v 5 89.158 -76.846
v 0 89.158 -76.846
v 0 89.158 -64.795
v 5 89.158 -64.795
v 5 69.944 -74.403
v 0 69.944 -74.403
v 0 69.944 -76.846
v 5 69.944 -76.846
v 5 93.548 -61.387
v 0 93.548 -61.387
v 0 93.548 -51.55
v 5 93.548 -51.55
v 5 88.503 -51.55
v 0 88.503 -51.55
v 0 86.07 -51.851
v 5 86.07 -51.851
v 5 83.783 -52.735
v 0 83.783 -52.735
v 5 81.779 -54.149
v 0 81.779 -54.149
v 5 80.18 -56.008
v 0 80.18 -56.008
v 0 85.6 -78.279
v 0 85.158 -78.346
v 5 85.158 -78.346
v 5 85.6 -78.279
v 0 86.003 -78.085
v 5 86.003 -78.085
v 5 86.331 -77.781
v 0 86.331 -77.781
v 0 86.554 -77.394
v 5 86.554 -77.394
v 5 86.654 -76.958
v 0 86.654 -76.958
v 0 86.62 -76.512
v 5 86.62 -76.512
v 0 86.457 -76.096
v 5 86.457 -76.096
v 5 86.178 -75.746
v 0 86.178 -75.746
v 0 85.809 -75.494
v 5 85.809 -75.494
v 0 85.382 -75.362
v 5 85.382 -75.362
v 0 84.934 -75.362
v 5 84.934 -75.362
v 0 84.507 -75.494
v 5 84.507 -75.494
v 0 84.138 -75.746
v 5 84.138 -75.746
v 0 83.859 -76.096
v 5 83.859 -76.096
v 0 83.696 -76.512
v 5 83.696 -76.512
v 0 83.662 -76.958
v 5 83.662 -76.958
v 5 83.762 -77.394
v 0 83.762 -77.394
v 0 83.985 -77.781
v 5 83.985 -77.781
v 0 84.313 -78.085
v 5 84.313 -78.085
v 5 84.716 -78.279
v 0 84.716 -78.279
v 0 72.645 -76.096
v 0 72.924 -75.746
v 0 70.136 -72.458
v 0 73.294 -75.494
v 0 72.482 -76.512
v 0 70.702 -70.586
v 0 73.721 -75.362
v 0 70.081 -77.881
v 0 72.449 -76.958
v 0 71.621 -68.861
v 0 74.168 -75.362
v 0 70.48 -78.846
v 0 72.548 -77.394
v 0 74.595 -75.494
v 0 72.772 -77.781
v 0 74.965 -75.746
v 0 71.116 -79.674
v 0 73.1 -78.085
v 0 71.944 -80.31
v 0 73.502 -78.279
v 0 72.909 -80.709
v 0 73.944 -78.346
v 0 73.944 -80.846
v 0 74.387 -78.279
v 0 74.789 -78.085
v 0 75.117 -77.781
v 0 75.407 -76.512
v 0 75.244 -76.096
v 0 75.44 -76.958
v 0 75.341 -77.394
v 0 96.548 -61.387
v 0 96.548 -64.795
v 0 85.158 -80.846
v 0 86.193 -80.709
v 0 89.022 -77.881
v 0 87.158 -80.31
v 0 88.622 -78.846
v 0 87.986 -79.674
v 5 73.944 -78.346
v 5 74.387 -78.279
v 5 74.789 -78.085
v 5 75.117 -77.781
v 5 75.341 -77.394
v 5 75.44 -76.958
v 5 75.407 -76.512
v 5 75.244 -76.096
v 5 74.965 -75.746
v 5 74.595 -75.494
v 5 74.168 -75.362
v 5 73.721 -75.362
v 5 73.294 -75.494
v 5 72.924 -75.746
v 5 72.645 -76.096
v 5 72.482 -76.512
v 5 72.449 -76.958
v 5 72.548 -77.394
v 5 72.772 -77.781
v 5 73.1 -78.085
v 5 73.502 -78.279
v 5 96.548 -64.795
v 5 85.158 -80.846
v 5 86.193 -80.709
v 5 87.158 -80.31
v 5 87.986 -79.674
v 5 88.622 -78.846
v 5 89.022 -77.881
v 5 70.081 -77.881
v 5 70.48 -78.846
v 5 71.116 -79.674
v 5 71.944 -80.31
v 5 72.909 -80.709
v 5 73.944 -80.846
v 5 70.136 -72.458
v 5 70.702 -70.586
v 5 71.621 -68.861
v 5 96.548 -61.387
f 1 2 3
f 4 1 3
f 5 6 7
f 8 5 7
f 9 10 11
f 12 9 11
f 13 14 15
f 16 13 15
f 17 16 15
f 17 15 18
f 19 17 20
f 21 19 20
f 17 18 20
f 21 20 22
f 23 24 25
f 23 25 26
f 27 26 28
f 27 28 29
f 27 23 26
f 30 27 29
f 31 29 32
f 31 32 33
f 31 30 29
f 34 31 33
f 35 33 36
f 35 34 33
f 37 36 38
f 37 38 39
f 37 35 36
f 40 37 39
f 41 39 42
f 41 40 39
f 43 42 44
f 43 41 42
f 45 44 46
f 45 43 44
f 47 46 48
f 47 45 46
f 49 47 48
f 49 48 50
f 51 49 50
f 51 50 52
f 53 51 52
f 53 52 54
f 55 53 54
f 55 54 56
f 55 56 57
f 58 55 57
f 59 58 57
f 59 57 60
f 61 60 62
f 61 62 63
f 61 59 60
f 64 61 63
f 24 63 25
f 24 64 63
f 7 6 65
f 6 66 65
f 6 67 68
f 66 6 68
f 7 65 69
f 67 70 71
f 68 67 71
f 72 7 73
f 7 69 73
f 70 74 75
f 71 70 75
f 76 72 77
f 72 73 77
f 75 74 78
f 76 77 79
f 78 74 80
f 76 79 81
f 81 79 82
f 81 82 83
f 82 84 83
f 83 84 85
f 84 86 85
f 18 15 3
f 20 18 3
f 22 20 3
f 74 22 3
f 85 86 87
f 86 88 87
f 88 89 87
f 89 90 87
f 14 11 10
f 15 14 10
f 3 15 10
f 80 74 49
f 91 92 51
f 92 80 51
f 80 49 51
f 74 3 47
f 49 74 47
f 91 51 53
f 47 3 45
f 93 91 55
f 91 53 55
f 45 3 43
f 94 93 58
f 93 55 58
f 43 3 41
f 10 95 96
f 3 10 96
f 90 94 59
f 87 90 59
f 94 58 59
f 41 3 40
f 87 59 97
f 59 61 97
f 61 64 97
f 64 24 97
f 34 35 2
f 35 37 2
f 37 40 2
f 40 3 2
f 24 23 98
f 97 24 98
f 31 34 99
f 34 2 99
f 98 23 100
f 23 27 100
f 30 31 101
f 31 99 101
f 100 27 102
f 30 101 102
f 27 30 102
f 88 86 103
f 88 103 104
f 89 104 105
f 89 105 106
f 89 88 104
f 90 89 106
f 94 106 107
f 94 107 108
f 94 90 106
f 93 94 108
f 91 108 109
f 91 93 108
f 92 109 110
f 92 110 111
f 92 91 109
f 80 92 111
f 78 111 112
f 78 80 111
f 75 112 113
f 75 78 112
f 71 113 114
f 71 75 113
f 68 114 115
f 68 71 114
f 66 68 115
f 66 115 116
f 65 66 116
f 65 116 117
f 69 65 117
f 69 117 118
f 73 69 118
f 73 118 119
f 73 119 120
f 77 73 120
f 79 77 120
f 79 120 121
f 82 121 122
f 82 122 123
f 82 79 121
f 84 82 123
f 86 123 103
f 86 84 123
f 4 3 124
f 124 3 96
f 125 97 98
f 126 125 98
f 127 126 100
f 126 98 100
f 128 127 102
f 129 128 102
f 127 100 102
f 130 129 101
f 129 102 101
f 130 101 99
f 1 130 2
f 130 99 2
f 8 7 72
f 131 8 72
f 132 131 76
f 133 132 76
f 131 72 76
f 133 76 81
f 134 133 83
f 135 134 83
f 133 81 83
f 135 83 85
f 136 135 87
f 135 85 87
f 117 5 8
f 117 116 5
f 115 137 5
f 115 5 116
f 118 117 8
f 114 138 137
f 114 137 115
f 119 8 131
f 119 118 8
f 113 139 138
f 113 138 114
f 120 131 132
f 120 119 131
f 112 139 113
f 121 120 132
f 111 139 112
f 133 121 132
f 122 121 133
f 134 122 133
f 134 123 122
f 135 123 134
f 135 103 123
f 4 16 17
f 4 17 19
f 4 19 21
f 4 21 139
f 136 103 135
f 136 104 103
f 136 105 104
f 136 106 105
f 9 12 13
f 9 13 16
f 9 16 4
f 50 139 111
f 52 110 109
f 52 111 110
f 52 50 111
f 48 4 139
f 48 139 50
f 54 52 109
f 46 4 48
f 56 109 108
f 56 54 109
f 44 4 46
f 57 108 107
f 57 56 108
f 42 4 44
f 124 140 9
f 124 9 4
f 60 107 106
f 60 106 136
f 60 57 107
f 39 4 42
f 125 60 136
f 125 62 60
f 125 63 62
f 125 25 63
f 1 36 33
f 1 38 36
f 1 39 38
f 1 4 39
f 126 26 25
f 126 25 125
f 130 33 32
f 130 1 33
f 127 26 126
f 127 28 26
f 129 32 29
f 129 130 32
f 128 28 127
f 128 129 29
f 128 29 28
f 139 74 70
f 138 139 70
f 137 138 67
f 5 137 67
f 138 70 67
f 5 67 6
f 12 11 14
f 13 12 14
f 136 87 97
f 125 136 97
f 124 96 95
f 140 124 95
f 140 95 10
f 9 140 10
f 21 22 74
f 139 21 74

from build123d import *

# Parameters (mm, degrees)
SKETCH1_R           = 4
SKETCH1_R_2         = 1.5
BOSS_EXTRUDE1_DEPTH = 5


with BuildPart() as part:
    # Sketch1 → Boss-Extrude1 (new body)
    with BuildSketch(Plane(origin=(0, 0, 0), x_dir=(0, 0, -1), z_dir=(1, 0, 0))):
        with Locations((76.845680628, 73.944481469)):
            Circle(SKETCH1_R)
        with Locations((76.845680628, 73.944481469)):
            Circle(SKETCH1_R_2, mode=Mode.SUBTRACT)
        with Locations((76.845680628, 85.158009083)):
            Circle(SKETCH1_R)
        with Locations((76.845680628, 85.158009083)):
            Circle(SKETCH1_R_2, mode=Mode.SUBTRACT)
        with BuildLine():
            Line((80.845680628, 73.944481469), (80.845680628, 85.158009083))
            ThreePointArc((80.845680628, 85.158009083), (74.017253503, 82.329581958), (76.845680628, 89.158009083))
            Line((76.845680628, 89.158009083), (64.794938344, 89.158009083))
            Line((64.794938344, 89.158009083), (64.794938344, 96.547739715))
            Line((64.794938344, 96.547739715), (61.386991095, 96.547739715))
            Line((61.386991095, 96.547739715), (61.386991095, 93.547739715))
            Line((61.386991095, 93.547739715), (51.550416078, 93.547739715))
            Line((51.550416078, 93.547739715), (51.550416078, 88.503490644))
            ThreePointArc((51.550416078, 88.503490644), (52.73489617, 83.782621152), (56.007737829, 80.180106847))
            Line((56.007737829, 80.180106847), (68.86071523, 71.621097672))
            ThreePointArc((68.86071523, 71.621097672), (71.508038403, 70.372808732), (74.403393479, 69.944481469))
            Line((74.403393479, 69.944481469), (76.845680628, 69.944481469))
            ThreePointArc((76.845680628, 69.944481469), (74.017253503, 76.772908593), (80.845680628, 73.944481469))
        make_face()
    extrude(amount=BOSS_EXTRUDE1_DEPTH)


solid = part.part
